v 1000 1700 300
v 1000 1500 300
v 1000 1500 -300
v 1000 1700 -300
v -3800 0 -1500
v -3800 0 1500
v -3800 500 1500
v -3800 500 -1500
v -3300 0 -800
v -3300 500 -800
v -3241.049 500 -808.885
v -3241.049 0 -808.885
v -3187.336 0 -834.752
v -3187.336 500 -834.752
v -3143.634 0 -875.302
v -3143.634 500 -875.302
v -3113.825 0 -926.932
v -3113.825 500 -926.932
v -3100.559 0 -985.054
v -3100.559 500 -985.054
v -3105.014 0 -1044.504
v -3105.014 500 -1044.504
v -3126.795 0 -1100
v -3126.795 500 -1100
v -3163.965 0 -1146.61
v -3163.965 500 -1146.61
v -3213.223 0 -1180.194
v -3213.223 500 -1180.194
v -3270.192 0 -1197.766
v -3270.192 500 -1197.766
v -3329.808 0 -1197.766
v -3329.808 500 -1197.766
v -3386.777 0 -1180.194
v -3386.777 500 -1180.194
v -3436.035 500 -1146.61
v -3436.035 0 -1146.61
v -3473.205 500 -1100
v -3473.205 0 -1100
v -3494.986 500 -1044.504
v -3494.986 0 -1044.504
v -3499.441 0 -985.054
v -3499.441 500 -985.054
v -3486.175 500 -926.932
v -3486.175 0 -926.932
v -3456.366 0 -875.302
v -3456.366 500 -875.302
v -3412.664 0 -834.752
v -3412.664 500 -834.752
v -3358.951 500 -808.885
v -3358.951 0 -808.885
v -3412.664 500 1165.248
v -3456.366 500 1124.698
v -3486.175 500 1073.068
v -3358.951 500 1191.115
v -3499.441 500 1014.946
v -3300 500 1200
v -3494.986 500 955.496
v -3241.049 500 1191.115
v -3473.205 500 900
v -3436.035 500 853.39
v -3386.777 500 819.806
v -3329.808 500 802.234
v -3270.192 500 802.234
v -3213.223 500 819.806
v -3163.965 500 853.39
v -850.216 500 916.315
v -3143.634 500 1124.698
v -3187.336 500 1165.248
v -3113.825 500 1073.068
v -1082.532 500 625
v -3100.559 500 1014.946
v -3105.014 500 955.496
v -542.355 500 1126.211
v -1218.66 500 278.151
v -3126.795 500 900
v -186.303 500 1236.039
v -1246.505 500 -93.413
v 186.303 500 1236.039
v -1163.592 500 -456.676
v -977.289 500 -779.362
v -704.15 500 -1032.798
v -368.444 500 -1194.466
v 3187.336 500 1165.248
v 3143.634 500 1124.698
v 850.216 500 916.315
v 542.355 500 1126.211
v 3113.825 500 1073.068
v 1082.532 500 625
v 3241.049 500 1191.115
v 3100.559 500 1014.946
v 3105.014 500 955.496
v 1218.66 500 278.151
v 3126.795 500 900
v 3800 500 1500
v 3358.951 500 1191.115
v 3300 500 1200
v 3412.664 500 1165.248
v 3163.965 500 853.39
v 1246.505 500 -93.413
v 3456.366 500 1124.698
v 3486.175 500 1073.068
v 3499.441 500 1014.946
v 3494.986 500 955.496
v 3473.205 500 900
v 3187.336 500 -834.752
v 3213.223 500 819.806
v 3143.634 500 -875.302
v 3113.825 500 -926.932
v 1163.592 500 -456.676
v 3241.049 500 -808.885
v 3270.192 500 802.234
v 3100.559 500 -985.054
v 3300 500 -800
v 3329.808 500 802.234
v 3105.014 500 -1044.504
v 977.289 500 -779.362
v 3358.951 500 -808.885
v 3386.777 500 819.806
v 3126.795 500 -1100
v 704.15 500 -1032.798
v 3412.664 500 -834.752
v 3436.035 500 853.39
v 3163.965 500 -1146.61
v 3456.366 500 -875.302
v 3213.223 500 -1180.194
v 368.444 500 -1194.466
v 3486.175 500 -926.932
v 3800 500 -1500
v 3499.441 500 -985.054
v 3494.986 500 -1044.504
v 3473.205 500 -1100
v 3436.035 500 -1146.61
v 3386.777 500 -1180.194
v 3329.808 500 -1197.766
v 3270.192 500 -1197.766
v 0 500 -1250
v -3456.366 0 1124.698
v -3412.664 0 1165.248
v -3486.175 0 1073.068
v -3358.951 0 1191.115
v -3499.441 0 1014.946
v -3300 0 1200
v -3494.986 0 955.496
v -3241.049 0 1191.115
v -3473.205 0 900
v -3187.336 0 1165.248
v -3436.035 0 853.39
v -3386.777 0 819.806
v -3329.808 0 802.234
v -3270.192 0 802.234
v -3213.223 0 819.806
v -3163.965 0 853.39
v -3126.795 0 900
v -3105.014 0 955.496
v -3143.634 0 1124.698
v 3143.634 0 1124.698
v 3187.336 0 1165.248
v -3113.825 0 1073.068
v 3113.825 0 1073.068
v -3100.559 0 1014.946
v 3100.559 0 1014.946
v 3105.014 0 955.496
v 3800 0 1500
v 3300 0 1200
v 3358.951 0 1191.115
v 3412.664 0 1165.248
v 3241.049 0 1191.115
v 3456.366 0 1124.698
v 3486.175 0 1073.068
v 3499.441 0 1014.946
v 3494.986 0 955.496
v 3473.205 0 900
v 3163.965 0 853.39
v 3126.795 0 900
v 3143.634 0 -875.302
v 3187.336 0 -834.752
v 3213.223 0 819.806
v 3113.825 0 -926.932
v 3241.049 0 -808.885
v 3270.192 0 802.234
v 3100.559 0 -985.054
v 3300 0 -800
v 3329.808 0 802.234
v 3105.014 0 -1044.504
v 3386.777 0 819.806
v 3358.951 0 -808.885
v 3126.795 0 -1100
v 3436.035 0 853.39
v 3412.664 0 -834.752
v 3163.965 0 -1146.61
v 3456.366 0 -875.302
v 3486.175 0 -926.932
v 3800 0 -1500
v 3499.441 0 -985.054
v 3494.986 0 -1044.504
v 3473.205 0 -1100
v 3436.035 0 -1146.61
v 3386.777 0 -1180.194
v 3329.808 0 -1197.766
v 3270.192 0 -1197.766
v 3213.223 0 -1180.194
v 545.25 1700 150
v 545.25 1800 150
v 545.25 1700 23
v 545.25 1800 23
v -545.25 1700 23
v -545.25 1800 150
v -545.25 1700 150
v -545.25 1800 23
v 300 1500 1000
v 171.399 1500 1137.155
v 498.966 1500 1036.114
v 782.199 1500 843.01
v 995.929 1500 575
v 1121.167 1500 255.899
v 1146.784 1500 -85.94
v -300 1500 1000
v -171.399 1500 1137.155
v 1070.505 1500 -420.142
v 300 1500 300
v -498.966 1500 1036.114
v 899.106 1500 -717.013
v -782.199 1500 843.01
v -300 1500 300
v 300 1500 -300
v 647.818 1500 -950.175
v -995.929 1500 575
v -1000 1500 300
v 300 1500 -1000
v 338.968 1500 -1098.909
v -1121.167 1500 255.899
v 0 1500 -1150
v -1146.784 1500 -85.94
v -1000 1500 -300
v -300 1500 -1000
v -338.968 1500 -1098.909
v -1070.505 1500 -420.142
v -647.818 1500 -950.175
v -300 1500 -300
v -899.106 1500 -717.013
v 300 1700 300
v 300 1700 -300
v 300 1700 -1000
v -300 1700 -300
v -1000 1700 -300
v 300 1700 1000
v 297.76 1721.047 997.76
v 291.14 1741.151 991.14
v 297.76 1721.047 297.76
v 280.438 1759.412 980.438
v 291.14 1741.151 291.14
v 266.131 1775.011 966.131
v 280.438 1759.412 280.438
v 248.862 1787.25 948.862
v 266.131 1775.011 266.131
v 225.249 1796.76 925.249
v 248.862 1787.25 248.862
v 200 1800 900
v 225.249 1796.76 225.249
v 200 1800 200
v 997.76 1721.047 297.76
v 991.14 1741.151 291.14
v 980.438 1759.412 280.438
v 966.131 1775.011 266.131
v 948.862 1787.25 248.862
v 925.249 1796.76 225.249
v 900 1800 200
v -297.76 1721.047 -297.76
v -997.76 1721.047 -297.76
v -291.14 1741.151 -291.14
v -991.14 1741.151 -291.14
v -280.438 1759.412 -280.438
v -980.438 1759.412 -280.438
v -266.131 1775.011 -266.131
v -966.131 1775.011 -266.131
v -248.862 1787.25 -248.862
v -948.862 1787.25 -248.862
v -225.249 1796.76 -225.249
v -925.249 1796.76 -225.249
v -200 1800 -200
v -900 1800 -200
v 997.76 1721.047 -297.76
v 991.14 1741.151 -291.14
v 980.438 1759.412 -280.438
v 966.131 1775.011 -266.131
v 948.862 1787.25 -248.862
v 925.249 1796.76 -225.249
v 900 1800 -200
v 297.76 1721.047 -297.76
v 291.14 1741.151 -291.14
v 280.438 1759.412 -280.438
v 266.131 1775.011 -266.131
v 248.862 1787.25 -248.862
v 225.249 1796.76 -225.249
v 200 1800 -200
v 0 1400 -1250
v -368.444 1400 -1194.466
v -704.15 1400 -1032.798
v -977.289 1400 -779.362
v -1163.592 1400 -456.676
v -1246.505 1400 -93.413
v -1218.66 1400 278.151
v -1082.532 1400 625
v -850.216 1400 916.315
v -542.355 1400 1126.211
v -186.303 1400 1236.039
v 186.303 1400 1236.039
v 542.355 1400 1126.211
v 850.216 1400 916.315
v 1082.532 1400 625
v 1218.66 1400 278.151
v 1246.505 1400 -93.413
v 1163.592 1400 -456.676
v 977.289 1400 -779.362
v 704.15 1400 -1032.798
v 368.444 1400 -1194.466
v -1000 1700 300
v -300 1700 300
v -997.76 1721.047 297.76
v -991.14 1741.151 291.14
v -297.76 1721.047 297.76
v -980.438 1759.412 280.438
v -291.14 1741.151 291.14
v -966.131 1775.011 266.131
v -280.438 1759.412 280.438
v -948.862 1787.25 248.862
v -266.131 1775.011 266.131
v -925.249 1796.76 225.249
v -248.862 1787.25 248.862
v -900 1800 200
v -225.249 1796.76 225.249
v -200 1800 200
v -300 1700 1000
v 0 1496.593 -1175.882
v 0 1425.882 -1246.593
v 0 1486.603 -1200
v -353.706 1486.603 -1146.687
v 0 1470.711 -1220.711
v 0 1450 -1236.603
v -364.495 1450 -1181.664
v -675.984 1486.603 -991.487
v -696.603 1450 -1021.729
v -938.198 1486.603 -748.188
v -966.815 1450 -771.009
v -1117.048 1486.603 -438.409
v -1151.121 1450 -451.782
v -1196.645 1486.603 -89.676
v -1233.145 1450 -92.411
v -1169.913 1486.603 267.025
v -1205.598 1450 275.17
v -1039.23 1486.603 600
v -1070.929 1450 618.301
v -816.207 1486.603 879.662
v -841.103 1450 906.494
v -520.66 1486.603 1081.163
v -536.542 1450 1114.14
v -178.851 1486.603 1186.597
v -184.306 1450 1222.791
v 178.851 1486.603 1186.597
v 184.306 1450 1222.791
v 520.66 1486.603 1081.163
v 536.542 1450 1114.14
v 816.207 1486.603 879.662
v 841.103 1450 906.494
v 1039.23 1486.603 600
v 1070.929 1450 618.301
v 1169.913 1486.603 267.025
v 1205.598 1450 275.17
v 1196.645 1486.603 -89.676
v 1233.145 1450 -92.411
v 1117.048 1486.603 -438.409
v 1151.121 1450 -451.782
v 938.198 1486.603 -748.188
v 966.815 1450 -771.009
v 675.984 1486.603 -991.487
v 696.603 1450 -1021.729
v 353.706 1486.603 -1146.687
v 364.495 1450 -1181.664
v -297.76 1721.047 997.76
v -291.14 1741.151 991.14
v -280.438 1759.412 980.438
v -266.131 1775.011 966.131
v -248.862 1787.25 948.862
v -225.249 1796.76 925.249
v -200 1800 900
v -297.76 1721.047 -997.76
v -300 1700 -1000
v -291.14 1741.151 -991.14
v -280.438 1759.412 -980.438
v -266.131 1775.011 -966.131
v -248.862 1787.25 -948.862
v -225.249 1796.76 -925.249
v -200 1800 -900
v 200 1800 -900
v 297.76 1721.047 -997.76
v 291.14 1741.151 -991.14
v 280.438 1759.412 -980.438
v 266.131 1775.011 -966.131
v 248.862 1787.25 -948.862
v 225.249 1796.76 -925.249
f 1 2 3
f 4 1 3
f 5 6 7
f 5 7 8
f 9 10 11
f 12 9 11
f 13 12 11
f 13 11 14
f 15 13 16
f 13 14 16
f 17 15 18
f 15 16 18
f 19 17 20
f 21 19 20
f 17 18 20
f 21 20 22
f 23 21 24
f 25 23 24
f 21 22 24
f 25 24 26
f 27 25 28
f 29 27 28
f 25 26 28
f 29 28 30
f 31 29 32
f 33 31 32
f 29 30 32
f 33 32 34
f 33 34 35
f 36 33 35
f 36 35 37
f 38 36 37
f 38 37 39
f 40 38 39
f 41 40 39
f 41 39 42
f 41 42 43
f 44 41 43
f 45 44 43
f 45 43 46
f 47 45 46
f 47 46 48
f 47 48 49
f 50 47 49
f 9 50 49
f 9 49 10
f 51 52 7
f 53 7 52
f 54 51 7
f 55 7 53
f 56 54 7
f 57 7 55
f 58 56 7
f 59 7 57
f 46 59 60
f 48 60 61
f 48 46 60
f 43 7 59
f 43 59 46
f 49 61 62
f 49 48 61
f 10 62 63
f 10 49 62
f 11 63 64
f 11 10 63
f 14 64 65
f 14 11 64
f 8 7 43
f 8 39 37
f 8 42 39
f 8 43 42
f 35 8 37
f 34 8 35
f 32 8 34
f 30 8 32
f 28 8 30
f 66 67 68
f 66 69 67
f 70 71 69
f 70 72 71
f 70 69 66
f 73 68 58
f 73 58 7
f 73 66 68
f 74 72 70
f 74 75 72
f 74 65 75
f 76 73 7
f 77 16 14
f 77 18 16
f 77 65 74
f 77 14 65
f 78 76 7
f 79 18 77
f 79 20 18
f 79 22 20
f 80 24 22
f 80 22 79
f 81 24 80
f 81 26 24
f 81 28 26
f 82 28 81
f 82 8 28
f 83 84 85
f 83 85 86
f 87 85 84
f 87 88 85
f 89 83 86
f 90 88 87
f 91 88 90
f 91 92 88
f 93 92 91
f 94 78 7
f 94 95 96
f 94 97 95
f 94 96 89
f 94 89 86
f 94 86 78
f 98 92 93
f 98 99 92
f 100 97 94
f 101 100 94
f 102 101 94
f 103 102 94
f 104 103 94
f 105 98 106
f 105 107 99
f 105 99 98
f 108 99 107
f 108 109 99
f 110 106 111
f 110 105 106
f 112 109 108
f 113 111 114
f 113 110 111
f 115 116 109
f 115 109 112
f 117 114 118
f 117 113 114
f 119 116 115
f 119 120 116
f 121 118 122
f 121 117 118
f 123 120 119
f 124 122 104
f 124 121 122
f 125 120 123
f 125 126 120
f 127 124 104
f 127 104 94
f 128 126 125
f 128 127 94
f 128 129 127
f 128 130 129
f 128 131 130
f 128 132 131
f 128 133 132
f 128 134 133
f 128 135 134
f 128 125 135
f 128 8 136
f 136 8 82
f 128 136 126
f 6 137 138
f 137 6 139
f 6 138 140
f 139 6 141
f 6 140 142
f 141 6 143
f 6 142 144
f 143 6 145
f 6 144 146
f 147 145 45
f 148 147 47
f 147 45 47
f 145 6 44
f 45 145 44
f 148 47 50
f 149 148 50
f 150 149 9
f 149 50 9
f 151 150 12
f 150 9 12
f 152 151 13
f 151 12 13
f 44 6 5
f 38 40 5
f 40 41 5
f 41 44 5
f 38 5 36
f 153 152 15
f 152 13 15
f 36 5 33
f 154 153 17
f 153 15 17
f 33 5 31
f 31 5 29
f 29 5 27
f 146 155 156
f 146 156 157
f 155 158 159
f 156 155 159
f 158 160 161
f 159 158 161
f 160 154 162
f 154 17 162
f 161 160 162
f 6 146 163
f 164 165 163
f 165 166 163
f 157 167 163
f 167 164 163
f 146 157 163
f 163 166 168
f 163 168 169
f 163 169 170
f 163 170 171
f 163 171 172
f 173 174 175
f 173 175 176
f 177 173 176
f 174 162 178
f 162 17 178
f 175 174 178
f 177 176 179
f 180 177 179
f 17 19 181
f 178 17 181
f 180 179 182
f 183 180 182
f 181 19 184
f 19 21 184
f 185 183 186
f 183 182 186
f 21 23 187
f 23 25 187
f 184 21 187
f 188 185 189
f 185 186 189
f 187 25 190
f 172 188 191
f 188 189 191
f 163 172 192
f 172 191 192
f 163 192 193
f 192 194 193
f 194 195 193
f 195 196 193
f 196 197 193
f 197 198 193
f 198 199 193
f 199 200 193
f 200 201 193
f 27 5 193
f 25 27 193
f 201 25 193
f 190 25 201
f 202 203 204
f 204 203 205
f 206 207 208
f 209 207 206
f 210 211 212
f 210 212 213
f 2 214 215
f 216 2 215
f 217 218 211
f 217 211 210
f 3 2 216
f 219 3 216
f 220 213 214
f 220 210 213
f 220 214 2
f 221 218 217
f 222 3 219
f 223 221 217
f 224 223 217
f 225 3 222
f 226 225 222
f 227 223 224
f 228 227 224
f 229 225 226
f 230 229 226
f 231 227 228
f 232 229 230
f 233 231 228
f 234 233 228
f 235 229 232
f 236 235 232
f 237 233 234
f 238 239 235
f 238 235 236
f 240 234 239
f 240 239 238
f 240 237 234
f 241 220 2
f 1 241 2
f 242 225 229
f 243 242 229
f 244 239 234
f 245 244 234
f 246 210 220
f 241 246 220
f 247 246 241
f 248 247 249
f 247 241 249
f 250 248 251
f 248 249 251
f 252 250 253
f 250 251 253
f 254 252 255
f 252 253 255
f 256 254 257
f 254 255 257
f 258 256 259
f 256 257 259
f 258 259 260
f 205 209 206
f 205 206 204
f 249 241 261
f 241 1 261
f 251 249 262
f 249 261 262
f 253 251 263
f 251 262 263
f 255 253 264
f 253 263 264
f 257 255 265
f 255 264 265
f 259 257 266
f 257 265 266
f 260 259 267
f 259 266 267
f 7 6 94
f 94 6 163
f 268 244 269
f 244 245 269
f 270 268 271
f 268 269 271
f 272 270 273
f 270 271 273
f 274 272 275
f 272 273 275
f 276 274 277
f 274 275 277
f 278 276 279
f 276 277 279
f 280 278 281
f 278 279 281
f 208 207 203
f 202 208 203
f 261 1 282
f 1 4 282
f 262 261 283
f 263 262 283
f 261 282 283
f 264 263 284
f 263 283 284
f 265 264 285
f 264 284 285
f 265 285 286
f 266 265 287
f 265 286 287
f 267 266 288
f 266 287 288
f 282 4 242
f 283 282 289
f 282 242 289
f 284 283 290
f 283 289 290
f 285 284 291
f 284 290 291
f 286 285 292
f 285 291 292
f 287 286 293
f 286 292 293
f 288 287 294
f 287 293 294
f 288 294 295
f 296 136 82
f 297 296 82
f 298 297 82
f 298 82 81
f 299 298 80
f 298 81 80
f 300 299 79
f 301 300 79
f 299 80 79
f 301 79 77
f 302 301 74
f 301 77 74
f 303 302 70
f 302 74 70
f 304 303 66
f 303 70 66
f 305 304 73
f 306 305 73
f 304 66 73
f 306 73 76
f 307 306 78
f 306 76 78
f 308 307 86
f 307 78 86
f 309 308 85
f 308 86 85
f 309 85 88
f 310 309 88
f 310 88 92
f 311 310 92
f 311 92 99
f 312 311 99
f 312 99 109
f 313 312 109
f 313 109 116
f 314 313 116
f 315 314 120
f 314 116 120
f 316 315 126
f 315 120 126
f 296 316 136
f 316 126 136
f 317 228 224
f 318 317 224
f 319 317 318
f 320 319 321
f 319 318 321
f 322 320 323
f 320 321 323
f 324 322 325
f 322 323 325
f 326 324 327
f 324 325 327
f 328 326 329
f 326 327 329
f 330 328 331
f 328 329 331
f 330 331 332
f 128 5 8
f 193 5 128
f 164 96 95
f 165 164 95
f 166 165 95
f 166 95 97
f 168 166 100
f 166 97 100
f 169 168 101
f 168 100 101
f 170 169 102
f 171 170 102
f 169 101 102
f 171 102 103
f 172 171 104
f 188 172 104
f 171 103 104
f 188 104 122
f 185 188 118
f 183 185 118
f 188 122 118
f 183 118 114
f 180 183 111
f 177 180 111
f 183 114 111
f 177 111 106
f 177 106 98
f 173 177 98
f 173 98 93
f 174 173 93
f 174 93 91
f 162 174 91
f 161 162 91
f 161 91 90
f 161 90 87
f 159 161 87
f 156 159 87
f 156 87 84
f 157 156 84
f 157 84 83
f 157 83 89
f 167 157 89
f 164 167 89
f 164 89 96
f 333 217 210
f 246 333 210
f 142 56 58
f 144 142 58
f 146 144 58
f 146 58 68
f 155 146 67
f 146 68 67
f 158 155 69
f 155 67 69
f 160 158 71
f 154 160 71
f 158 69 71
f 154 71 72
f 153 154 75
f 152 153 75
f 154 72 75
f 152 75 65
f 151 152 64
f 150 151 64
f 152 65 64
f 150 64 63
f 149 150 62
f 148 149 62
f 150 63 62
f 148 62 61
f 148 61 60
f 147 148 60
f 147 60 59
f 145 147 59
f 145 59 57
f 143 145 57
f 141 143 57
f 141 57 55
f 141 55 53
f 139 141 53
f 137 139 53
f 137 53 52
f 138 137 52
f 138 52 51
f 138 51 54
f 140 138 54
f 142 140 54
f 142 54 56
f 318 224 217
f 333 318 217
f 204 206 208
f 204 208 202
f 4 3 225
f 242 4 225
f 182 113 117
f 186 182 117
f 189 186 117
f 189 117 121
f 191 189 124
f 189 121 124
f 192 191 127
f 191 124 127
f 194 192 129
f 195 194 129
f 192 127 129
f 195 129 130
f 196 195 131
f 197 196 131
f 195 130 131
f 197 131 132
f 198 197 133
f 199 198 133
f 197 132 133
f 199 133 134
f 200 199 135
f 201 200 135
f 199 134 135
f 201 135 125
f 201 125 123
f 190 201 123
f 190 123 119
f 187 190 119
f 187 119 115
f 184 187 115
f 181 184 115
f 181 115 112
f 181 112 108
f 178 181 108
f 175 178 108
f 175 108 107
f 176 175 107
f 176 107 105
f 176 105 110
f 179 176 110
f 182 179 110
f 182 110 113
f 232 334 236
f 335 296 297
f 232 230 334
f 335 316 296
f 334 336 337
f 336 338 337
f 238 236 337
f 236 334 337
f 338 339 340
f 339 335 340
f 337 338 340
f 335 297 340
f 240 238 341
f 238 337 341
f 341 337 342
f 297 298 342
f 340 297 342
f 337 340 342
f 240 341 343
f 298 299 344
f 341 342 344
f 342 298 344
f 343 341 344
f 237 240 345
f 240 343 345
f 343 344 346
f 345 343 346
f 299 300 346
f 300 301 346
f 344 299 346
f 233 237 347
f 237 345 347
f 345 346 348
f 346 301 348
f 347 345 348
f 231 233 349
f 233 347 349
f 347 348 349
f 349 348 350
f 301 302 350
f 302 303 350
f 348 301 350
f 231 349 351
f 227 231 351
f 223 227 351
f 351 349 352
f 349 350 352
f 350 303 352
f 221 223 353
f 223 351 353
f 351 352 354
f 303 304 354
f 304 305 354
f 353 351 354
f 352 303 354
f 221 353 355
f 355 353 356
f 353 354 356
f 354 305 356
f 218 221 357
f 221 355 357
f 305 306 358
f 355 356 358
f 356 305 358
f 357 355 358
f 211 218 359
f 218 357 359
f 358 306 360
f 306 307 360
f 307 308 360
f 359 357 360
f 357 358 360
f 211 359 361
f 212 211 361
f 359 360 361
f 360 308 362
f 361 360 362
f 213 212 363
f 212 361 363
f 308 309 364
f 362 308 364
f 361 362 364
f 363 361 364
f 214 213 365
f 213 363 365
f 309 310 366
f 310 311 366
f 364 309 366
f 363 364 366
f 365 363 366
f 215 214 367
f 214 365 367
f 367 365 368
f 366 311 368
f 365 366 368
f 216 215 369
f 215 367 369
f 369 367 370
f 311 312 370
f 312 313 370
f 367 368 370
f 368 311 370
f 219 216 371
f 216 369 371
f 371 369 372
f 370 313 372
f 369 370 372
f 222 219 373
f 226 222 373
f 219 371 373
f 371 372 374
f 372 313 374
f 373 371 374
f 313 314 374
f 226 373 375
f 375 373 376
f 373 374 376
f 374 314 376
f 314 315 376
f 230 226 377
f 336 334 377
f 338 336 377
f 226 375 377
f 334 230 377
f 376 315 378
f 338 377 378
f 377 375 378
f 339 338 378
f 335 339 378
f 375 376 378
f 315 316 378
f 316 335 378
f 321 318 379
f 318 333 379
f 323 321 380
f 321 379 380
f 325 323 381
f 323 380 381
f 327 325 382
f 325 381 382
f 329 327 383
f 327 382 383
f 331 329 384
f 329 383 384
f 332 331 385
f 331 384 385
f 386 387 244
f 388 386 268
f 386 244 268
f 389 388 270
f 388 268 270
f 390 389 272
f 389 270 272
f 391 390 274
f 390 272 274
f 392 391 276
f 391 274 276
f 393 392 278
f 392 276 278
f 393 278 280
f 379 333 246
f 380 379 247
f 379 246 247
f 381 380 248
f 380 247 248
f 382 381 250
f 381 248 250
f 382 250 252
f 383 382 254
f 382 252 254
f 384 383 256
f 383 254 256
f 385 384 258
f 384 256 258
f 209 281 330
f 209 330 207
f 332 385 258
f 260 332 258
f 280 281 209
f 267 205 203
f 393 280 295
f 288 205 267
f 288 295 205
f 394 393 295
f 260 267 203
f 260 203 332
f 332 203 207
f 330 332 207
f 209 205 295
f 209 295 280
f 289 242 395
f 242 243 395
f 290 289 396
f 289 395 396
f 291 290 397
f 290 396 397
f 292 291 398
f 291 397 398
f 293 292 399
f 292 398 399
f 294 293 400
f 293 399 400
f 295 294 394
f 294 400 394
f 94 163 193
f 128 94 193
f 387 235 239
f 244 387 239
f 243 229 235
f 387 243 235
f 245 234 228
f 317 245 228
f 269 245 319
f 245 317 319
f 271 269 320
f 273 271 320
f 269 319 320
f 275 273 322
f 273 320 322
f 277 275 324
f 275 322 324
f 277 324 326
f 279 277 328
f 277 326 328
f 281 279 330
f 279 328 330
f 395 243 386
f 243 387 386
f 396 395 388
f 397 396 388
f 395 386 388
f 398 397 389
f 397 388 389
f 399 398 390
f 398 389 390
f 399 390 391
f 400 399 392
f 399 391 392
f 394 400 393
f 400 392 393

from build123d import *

# Parameters (mm, degrees)
SKETCH1_W           = 7600
SKETCH1_H           = 3000
BOSS_EXTRUDE1_DEPTH = 500
SKETCH2_R           = 200
CUT_EXTRUDE1_DEPTH  = 1000
SKETCH3_R           = 1250
BOSS_EXTRUDE2_DEPTH = 1000
BOSS_EXTRUDE3_DEPTH = 300
FILLET1_R           = 100
FILLET2_R           = 100
SKETCH6_W           = 1090.5
SKETCH6_H           = 127
CUT_EXTRUDE2_DEPTH  = 100


with BuildPart() as part:
    # Sketch1 → Boss-Extrude1 (new body)
    with BuildSketch(Plane(origin=(0, 0, 0), x_dir=(1, 0, 0), z_dir=(0, 1, 0))):
        Rectangle(SKETCH1_W, SKETCH1_H)
    extrude(amount=BOSS_EXTRUDE1_DEPTH)

    # Sketch2 → Cut-Extrude1 (cut)
    with BuildSketch(Plane(origin=(0, 500, 0), x_dir=(1, 0, 0), z_dir=(0, 1, 0))):
        with Locations(Location((-3300, -1000, 0), (0, 0, 270))):
            Circle(SKETCH2_R)
        with Locations(Location((-3300, 1000, 0), (0, 0, 270))):
            Circle(SKETCH2_R)
        with Locations(Location((3300, 1000, 0), (0, 0, 270))):
            Circle(SKETCH2_R)
        with Locations(Location((3300, -1000, 0), (0, 0, 270))):
            Circle(SKETCH2_R)
    extrude(amount=-CUT_EXTRUDE1_DEPTH, mode=Mode.SUBTRACT)

    # Sketch3 → Boss-Extrude2 (add)
    with BuildSketch(Plane(origin=(0, 500, 0), x_dir=(1, 0, 0), z_dir=(0, 1, 0))):
        with Locations(Location((0, 0, 0), (0, 0, 90))):
            Circle(SKETCH3_R)
    extrude(amount=BOSS_EXTRUDE2_DEPTH)

    # Sketch4 → Boss-Extrude3 (add)
    with BuildSketch(Plane(origin=(0, 1500, 0), x_dir=(1, 0, 0), z_dir=(0, 1, 0))):
        Polygon((-300, -300), (-300, -1000), (300, -1000), (300, -300), (1000, -300), (1000, 300), (300, 300), (300, 1000), (-300, 1000), (-300, 300), (-1000, 300), (-1000, -300), align=None)
    extrude(amount=BOSS_EXTRUDE3_DEPTH)

    # Fillet1
    fillet1_edges = [part.edges().sort_by_distance(p)[0] for p in [
        (300, 1800, 650),
        (650, 1800, 300),
        (1000, 1800, 0),
        (650, 1800, -300),
        (300, 1800, -650),
        (0, 1800, -1000),
        (-300, 1800, -650),
        (-650, 1800, -300),
        (-1000, 1800, 0),
        (-650, 1800, 300),
        (-300, 1800, 650),
        (0, 1800, 1000),
    ]]
    fillet(fillet1_edges, radius=FILLET1_R)

    # Fillet2
    fillet2_edges = [part.edges().sort_by_distance(p)[0] for p in [
        (0, 1500, 1250),
    ]]
    fillet(fillet2_edges, radius=FILLET2_R)

    # Sketch6 → Cut-Extrude2 (cut)
    with BuildSketch(Plane(origin=(0, 1800, 0), x_dir=(1, 0, 0), z_dir=(0, 1, 0))):
        with Locations((0, -86.5)):
            Rectangle(SKETCH6_W, SKETCH6_H)
    extrude(amount=-CUT_EXTRUDE2_DEPTH, mode=Mode.SUBTRACT)


solid = part.part
